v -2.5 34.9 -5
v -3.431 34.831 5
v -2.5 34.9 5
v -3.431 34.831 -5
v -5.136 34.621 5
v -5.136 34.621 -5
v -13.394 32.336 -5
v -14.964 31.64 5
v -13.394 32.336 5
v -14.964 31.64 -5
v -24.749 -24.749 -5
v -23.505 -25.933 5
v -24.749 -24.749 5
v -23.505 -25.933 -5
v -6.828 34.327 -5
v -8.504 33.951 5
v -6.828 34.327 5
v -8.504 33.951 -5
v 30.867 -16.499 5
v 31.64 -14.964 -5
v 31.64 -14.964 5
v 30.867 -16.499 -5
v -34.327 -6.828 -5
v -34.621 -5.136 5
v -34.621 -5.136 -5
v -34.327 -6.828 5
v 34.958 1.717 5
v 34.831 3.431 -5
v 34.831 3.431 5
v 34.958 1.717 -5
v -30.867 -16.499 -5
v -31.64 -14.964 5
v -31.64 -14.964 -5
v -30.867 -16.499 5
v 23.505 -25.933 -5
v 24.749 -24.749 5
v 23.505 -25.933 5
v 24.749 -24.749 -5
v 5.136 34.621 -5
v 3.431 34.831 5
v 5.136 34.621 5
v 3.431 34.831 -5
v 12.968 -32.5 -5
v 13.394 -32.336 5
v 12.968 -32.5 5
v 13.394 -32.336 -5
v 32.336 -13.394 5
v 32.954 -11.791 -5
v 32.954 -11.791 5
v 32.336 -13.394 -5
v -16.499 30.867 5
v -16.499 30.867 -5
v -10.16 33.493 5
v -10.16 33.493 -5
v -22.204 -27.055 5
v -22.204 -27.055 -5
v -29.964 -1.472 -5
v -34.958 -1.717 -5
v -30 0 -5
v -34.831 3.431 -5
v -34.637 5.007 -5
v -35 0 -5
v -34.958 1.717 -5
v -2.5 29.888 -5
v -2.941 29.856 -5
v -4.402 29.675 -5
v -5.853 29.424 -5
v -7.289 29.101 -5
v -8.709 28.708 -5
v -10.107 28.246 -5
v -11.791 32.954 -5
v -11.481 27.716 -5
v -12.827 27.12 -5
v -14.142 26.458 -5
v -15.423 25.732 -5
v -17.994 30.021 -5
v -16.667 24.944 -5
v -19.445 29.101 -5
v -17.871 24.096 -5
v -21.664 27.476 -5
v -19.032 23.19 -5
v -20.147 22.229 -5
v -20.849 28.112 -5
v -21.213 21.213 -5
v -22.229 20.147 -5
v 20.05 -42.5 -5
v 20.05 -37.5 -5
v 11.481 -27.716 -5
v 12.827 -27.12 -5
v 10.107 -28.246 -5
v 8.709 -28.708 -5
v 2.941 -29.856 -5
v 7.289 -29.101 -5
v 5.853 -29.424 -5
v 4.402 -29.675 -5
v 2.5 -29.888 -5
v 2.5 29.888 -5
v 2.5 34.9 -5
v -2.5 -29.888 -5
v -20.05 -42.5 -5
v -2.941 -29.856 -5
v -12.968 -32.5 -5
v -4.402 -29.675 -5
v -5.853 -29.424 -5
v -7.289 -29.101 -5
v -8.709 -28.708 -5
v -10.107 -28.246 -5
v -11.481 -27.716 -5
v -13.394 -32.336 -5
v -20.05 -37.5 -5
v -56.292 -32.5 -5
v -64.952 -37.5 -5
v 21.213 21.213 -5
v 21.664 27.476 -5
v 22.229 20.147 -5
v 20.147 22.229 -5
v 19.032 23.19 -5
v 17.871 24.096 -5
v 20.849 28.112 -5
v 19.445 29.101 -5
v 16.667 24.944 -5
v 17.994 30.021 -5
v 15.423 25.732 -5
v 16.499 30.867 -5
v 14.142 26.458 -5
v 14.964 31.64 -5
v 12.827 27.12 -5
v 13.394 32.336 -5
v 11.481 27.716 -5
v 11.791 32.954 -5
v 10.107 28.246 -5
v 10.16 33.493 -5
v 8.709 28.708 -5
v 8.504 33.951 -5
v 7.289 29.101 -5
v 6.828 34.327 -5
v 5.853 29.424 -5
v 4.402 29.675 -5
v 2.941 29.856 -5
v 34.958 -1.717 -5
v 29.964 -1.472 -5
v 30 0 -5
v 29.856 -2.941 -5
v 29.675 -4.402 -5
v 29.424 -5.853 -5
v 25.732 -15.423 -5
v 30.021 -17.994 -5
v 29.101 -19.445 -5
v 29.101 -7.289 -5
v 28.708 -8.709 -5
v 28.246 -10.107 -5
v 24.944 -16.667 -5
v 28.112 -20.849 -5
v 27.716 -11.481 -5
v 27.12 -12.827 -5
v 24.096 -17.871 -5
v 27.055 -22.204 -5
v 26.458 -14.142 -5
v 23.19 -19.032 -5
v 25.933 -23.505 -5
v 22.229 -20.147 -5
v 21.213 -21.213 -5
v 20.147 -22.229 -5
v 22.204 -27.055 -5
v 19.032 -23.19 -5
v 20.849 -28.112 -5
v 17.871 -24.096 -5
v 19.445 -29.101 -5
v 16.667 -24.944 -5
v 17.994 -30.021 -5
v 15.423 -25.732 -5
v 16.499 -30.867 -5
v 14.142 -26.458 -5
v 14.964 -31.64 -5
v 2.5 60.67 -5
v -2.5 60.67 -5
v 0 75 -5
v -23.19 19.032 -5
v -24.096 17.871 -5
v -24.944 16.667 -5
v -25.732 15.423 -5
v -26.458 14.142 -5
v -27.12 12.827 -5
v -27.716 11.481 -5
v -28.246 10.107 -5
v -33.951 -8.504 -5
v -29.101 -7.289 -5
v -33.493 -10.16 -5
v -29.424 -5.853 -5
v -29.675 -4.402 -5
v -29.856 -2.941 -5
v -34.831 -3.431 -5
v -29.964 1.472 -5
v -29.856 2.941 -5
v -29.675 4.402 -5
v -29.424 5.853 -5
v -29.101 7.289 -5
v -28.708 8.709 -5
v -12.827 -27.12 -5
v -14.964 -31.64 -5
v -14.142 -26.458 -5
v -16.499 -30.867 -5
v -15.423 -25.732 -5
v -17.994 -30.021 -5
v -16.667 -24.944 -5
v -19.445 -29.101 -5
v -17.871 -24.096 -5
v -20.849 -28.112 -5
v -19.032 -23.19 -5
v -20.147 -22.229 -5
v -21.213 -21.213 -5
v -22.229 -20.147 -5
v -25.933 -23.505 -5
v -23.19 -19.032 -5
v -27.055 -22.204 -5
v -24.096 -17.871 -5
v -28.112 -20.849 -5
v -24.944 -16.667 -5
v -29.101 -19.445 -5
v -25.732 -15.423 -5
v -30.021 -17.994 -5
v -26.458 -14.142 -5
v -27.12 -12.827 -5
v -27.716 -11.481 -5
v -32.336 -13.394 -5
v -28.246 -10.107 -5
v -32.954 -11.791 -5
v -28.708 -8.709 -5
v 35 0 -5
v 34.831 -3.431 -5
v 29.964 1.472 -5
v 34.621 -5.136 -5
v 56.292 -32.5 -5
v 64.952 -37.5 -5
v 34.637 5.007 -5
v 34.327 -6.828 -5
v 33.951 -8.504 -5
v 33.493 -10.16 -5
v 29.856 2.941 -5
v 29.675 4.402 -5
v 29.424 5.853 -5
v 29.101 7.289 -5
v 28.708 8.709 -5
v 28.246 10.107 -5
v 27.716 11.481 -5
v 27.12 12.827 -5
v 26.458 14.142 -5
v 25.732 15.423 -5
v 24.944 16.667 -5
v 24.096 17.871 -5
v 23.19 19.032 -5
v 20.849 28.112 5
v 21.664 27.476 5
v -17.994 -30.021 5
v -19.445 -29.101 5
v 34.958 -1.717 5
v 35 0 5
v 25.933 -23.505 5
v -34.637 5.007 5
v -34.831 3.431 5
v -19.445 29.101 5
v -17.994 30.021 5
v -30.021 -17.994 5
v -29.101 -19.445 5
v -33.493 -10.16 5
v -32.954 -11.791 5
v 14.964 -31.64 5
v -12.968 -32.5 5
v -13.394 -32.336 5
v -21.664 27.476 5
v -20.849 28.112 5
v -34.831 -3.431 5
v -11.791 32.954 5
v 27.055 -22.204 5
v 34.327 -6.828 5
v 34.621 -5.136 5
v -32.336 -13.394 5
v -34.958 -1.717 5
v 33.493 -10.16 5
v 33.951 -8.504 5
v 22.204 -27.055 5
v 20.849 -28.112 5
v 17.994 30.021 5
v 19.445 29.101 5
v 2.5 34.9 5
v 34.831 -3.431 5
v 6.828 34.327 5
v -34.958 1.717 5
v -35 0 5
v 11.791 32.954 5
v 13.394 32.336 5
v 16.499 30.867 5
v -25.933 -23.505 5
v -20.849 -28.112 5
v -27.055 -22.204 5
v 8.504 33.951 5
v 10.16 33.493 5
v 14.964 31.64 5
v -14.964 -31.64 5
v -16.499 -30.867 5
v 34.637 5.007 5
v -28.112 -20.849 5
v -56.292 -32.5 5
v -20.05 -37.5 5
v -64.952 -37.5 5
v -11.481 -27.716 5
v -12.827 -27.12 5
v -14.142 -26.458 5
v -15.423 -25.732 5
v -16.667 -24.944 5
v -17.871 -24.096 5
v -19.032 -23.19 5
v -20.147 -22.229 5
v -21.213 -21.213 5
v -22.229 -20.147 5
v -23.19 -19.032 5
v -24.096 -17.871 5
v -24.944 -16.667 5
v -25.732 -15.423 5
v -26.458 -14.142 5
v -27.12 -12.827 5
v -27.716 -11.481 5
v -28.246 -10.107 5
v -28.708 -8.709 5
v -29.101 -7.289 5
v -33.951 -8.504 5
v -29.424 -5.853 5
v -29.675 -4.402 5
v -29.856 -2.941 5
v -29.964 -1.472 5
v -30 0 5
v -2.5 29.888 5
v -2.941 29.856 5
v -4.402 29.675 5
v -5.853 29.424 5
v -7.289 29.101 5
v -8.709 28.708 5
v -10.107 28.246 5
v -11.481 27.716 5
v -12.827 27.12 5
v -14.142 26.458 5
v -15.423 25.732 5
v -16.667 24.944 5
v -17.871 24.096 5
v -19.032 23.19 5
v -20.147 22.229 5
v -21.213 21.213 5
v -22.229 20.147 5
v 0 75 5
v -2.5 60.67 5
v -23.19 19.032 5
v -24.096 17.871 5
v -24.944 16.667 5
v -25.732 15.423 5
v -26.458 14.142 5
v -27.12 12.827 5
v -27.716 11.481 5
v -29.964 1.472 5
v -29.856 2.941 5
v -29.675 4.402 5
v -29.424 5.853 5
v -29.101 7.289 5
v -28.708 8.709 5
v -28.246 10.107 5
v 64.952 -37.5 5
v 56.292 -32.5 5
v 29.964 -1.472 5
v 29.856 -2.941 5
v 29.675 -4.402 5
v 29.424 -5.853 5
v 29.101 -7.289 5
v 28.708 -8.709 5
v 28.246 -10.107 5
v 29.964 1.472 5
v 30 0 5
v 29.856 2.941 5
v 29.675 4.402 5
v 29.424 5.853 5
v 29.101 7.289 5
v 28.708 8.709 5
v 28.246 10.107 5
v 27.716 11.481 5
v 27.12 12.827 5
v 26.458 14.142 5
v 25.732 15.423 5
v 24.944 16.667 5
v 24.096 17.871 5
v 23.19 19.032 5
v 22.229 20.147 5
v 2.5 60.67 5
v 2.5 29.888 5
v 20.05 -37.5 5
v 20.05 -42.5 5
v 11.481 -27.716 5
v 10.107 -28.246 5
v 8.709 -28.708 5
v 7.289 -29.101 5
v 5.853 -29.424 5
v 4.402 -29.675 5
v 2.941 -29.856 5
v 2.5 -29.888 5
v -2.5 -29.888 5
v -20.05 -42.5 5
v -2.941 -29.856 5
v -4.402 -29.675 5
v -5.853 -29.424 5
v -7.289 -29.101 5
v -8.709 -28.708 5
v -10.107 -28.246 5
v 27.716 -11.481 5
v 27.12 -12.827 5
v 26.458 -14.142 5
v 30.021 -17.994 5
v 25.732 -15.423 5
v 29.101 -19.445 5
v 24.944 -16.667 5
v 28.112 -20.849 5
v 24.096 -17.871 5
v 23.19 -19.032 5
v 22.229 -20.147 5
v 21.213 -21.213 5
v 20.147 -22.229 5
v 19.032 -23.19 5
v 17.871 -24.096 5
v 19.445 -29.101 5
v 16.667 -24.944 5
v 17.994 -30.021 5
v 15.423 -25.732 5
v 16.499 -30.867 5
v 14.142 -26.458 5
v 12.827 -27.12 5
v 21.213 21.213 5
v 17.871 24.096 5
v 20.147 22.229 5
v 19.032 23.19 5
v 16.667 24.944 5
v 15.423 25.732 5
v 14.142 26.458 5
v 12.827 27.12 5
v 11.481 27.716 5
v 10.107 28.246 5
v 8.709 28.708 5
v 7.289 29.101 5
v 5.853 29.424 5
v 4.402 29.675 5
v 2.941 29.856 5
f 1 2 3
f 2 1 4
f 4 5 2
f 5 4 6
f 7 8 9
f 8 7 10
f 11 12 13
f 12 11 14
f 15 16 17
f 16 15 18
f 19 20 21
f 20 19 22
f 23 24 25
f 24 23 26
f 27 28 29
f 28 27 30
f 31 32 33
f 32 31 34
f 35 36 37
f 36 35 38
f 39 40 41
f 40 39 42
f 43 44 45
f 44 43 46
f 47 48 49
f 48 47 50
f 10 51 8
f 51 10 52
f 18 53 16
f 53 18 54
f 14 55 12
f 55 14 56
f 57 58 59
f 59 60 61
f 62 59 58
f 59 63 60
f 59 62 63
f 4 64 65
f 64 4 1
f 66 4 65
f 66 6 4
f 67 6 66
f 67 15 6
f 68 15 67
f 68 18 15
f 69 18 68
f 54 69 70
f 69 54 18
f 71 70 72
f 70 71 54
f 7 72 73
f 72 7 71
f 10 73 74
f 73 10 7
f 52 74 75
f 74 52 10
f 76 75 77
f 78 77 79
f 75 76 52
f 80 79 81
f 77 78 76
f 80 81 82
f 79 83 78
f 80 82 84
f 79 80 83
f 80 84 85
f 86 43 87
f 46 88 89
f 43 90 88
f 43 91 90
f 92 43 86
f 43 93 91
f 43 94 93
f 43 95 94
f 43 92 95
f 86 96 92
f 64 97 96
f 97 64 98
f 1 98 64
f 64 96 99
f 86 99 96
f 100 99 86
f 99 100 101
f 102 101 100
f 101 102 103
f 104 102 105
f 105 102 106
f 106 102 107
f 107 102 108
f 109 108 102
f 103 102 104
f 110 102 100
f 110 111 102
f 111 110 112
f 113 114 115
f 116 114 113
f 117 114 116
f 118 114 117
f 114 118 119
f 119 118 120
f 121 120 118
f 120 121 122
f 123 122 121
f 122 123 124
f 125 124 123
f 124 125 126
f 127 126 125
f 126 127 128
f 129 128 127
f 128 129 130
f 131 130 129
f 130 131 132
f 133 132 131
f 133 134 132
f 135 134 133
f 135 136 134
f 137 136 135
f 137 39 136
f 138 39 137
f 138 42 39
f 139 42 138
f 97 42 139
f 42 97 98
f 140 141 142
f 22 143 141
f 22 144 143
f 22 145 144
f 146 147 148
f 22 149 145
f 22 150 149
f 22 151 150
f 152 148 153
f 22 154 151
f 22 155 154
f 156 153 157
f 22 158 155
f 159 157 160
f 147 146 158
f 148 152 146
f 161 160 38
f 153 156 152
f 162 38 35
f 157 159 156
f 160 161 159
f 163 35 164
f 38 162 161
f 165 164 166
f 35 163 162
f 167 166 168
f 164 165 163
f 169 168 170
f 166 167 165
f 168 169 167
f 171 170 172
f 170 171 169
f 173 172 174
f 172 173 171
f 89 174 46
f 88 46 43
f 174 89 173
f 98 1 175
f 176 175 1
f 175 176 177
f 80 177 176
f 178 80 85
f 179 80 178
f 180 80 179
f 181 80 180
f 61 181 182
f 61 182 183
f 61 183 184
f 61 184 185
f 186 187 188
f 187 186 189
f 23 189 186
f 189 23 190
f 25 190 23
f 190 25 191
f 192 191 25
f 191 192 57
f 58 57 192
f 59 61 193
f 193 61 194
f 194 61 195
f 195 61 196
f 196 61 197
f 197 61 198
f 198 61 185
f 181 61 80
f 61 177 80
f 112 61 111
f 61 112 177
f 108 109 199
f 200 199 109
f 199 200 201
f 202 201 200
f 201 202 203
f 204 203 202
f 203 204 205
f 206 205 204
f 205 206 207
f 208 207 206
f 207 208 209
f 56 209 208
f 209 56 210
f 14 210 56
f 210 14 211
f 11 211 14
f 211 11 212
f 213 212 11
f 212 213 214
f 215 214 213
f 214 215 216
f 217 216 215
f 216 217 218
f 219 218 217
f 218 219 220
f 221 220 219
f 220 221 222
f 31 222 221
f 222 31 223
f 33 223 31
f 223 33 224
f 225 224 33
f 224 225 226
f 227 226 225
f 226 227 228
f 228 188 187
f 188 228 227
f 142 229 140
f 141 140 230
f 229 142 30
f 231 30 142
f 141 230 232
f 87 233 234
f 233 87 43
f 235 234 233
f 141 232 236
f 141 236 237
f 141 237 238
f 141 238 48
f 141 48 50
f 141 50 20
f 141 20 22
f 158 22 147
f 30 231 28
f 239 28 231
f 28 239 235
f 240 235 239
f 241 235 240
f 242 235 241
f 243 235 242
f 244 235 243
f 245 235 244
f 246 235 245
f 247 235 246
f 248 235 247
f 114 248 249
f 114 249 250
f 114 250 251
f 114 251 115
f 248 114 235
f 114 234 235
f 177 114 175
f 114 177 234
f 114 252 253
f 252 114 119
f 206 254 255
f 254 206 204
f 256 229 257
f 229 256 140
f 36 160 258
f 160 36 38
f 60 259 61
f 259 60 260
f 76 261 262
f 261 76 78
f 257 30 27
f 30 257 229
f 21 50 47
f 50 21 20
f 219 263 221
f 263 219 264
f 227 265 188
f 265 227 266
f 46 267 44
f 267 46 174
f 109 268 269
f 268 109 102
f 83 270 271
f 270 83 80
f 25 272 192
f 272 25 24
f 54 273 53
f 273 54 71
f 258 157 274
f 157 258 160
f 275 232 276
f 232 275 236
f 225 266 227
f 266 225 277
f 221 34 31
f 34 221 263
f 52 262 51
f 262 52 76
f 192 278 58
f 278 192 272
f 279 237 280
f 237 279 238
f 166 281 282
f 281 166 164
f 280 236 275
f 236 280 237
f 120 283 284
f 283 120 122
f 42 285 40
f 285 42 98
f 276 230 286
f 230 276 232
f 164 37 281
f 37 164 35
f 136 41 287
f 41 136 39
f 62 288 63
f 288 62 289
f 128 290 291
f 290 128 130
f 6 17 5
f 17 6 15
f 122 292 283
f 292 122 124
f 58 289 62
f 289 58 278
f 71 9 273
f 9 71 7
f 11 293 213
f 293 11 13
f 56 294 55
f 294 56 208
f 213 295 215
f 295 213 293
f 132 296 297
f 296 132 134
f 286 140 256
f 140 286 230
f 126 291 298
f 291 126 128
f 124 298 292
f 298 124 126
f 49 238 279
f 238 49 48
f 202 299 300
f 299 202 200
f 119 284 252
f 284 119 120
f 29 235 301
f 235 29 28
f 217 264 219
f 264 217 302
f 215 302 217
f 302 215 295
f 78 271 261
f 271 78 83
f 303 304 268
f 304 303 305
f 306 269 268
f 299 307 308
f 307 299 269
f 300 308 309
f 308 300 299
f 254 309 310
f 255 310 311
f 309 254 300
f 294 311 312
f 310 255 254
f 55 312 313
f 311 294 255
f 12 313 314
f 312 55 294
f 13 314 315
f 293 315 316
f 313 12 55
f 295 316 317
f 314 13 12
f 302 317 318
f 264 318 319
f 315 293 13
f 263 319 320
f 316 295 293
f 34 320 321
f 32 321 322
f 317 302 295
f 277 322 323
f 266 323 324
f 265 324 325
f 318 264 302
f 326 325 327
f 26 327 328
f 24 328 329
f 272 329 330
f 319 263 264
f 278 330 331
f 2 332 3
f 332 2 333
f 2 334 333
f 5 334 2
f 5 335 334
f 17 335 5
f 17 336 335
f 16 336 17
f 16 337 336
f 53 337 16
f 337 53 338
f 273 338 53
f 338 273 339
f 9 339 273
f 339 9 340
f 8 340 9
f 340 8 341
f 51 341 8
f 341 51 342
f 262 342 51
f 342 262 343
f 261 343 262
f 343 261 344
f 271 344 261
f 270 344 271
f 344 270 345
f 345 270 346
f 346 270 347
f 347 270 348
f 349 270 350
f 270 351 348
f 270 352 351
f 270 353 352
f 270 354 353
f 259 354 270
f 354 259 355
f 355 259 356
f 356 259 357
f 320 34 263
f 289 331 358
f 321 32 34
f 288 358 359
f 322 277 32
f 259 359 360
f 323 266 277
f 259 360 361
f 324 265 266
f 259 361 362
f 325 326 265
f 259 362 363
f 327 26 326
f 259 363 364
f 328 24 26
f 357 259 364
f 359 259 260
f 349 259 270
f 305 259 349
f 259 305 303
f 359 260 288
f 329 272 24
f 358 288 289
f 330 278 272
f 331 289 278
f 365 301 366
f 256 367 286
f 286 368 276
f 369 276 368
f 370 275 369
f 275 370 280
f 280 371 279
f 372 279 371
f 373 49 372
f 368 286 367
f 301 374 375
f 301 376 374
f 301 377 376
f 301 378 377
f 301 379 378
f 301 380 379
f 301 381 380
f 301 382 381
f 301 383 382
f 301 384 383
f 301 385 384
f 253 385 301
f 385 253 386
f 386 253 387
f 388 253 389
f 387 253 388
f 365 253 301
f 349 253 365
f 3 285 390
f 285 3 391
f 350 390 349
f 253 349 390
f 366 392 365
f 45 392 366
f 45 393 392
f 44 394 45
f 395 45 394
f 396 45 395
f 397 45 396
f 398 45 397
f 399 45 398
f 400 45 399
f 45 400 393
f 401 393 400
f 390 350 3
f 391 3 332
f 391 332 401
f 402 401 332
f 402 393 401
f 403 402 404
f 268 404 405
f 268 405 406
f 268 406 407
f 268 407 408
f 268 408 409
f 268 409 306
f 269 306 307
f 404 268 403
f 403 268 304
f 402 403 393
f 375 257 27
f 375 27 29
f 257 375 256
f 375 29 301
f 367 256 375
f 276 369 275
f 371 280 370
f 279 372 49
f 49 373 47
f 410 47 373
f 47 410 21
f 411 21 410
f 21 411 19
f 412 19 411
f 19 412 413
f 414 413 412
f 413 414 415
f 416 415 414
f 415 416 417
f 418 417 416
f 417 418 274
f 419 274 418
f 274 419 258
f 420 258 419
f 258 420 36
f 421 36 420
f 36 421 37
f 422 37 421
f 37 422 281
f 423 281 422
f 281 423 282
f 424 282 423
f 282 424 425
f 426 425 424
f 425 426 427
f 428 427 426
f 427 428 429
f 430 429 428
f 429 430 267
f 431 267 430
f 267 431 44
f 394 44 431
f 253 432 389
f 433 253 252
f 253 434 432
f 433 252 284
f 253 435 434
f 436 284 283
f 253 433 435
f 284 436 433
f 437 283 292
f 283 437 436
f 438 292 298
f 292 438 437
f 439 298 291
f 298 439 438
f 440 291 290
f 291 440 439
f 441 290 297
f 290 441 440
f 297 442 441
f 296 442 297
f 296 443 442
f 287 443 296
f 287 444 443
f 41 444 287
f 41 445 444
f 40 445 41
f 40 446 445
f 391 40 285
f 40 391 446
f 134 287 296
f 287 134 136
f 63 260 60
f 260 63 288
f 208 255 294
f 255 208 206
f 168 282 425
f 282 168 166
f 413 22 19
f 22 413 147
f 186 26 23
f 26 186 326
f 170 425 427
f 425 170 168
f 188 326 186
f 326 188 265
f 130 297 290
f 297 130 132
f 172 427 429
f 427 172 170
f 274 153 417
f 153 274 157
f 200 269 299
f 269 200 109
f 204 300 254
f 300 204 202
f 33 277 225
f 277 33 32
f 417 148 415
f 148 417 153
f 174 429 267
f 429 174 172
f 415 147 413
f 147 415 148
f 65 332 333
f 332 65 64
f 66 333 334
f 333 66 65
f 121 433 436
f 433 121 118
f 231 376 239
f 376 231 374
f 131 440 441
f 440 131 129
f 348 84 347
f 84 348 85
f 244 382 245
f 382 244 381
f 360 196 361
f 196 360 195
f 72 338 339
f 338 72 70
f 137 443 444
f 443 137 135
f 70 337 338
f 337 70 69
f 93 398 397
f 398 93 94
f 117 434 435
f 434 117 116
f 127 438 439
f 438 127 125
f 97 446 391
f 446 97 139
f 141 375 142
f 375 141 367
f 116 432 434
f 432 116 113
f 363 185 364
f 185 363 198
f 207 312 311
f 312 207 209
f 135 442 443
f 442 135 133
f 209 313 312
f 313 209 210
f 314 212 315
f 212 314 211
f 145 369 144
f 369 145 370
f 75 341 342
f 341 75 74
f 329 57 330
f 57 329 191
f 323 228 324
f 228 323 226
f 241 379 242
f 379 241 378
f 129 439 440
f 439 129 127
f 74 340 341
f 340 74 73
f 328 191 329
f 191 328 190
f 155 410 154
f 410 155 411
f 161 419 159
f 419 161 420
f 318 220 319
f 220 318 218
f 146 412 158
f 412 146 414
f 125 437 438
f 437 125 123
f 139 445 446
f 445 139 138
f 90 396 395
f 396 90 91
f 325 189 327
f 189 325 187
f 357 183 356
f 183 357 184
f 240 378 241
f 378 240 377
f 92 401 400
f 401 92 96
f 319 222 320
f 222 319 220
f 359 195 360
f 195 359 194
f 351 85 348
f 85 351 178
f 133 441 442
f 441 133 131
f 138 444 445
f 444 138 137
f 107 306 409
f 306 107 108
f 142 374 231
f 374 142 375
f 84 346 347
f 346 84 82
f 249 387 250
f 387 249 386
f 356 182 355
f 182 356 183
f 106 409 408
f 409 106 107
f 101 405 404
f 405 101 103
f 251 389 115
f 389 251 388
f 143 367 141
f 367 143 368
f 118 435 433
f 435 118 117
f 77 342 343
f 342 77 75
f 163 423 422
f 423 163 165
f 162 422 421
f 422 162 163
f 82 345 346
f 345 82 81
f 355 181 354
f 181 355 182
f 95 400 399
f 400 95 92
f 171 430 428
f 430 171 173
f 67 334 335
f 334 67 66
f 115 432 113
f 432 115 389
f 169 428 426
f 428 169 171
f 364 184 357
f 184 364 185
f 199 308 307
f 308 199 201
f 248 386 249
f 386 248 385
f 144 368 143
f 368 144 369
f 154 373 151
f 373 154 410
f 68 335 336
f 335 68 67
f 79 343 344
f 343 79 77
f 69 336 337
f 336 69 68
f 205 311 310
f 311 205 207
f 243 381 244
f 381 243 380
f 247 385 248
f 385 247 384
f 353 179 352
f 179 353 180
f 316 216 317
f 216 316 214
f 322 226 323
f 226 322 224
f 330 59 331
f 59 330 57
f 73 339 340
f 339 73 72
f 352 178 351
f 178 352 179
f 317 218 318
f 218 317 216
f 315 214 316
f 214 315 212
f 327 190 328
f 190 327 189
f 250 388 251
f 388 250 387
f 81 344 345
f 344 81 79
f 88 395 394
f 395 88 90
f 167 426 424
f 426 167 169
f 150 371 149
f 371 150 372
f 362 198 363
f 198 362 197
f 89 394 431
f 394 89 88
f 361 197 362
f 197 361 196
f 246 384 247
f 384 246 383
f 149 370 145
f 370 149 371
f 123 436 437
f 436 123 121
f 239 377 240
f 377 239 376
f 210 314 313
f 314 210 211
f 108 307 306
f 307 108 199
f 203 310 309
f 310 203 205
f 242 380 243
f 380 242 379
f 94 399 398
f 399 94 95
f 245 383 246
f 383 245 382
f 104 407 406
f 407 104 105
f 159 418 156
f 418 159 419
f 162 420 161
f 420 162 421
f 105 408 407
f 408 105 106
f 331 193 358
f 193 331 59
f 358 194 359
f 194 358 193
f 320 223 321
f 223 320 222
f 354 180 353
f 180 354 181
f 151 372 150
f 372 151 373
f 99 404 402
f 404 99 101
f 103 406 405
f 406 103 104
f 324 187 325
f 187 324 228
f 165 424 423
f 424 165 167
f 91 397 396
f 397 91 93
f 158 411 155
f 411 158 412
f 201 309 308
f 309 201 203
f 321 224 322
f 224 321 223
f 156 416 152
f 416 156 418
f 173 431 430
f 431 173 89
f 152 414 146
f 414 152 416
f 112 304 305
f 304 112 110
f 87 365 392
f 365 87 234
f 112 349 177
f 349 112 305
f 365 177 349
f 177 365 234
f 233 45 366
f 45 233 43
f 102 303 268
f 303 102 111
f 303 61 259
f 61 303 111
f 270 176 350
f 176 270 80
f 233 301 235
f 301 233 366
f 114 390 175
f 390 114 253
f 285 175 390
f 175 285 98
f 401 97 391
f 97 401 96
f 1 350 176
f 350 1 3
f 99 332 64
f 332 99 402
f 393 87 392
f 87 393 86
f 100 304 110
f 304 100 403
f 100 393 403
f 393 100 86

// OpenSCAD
/*
Deathly-Hallows-OpenSCAD by Sven Minio is licensed under a Creative Commons Attribution-NonCommercial-ShareAlike 4.0 International License.
To view a copy of this license, visit http://creativecommons.org/licenses/by-nc-sa/4.0/.
Based on a work at https://github.com/k37z3r/Deathly-Hallows-OpenSCAD.
*/
union(){
    rotate([0,0,90])union(){
        difference(){
            cylinder(h=10, d=70, center=true, $fn=128);
            cylinder(h=12, d=60, center=true, $fn=128);
        }
        difference(){
            cylinder(h=10, d=150, center=true, $fn=3);
            cylinder(h=12, d=130, center=true, $fn=3);
        }
    }
    translate([0,20,0])cube([5,100,10], center=true);
    translate([0,-40,0])cube([40.1,5,10], center=true);
}
